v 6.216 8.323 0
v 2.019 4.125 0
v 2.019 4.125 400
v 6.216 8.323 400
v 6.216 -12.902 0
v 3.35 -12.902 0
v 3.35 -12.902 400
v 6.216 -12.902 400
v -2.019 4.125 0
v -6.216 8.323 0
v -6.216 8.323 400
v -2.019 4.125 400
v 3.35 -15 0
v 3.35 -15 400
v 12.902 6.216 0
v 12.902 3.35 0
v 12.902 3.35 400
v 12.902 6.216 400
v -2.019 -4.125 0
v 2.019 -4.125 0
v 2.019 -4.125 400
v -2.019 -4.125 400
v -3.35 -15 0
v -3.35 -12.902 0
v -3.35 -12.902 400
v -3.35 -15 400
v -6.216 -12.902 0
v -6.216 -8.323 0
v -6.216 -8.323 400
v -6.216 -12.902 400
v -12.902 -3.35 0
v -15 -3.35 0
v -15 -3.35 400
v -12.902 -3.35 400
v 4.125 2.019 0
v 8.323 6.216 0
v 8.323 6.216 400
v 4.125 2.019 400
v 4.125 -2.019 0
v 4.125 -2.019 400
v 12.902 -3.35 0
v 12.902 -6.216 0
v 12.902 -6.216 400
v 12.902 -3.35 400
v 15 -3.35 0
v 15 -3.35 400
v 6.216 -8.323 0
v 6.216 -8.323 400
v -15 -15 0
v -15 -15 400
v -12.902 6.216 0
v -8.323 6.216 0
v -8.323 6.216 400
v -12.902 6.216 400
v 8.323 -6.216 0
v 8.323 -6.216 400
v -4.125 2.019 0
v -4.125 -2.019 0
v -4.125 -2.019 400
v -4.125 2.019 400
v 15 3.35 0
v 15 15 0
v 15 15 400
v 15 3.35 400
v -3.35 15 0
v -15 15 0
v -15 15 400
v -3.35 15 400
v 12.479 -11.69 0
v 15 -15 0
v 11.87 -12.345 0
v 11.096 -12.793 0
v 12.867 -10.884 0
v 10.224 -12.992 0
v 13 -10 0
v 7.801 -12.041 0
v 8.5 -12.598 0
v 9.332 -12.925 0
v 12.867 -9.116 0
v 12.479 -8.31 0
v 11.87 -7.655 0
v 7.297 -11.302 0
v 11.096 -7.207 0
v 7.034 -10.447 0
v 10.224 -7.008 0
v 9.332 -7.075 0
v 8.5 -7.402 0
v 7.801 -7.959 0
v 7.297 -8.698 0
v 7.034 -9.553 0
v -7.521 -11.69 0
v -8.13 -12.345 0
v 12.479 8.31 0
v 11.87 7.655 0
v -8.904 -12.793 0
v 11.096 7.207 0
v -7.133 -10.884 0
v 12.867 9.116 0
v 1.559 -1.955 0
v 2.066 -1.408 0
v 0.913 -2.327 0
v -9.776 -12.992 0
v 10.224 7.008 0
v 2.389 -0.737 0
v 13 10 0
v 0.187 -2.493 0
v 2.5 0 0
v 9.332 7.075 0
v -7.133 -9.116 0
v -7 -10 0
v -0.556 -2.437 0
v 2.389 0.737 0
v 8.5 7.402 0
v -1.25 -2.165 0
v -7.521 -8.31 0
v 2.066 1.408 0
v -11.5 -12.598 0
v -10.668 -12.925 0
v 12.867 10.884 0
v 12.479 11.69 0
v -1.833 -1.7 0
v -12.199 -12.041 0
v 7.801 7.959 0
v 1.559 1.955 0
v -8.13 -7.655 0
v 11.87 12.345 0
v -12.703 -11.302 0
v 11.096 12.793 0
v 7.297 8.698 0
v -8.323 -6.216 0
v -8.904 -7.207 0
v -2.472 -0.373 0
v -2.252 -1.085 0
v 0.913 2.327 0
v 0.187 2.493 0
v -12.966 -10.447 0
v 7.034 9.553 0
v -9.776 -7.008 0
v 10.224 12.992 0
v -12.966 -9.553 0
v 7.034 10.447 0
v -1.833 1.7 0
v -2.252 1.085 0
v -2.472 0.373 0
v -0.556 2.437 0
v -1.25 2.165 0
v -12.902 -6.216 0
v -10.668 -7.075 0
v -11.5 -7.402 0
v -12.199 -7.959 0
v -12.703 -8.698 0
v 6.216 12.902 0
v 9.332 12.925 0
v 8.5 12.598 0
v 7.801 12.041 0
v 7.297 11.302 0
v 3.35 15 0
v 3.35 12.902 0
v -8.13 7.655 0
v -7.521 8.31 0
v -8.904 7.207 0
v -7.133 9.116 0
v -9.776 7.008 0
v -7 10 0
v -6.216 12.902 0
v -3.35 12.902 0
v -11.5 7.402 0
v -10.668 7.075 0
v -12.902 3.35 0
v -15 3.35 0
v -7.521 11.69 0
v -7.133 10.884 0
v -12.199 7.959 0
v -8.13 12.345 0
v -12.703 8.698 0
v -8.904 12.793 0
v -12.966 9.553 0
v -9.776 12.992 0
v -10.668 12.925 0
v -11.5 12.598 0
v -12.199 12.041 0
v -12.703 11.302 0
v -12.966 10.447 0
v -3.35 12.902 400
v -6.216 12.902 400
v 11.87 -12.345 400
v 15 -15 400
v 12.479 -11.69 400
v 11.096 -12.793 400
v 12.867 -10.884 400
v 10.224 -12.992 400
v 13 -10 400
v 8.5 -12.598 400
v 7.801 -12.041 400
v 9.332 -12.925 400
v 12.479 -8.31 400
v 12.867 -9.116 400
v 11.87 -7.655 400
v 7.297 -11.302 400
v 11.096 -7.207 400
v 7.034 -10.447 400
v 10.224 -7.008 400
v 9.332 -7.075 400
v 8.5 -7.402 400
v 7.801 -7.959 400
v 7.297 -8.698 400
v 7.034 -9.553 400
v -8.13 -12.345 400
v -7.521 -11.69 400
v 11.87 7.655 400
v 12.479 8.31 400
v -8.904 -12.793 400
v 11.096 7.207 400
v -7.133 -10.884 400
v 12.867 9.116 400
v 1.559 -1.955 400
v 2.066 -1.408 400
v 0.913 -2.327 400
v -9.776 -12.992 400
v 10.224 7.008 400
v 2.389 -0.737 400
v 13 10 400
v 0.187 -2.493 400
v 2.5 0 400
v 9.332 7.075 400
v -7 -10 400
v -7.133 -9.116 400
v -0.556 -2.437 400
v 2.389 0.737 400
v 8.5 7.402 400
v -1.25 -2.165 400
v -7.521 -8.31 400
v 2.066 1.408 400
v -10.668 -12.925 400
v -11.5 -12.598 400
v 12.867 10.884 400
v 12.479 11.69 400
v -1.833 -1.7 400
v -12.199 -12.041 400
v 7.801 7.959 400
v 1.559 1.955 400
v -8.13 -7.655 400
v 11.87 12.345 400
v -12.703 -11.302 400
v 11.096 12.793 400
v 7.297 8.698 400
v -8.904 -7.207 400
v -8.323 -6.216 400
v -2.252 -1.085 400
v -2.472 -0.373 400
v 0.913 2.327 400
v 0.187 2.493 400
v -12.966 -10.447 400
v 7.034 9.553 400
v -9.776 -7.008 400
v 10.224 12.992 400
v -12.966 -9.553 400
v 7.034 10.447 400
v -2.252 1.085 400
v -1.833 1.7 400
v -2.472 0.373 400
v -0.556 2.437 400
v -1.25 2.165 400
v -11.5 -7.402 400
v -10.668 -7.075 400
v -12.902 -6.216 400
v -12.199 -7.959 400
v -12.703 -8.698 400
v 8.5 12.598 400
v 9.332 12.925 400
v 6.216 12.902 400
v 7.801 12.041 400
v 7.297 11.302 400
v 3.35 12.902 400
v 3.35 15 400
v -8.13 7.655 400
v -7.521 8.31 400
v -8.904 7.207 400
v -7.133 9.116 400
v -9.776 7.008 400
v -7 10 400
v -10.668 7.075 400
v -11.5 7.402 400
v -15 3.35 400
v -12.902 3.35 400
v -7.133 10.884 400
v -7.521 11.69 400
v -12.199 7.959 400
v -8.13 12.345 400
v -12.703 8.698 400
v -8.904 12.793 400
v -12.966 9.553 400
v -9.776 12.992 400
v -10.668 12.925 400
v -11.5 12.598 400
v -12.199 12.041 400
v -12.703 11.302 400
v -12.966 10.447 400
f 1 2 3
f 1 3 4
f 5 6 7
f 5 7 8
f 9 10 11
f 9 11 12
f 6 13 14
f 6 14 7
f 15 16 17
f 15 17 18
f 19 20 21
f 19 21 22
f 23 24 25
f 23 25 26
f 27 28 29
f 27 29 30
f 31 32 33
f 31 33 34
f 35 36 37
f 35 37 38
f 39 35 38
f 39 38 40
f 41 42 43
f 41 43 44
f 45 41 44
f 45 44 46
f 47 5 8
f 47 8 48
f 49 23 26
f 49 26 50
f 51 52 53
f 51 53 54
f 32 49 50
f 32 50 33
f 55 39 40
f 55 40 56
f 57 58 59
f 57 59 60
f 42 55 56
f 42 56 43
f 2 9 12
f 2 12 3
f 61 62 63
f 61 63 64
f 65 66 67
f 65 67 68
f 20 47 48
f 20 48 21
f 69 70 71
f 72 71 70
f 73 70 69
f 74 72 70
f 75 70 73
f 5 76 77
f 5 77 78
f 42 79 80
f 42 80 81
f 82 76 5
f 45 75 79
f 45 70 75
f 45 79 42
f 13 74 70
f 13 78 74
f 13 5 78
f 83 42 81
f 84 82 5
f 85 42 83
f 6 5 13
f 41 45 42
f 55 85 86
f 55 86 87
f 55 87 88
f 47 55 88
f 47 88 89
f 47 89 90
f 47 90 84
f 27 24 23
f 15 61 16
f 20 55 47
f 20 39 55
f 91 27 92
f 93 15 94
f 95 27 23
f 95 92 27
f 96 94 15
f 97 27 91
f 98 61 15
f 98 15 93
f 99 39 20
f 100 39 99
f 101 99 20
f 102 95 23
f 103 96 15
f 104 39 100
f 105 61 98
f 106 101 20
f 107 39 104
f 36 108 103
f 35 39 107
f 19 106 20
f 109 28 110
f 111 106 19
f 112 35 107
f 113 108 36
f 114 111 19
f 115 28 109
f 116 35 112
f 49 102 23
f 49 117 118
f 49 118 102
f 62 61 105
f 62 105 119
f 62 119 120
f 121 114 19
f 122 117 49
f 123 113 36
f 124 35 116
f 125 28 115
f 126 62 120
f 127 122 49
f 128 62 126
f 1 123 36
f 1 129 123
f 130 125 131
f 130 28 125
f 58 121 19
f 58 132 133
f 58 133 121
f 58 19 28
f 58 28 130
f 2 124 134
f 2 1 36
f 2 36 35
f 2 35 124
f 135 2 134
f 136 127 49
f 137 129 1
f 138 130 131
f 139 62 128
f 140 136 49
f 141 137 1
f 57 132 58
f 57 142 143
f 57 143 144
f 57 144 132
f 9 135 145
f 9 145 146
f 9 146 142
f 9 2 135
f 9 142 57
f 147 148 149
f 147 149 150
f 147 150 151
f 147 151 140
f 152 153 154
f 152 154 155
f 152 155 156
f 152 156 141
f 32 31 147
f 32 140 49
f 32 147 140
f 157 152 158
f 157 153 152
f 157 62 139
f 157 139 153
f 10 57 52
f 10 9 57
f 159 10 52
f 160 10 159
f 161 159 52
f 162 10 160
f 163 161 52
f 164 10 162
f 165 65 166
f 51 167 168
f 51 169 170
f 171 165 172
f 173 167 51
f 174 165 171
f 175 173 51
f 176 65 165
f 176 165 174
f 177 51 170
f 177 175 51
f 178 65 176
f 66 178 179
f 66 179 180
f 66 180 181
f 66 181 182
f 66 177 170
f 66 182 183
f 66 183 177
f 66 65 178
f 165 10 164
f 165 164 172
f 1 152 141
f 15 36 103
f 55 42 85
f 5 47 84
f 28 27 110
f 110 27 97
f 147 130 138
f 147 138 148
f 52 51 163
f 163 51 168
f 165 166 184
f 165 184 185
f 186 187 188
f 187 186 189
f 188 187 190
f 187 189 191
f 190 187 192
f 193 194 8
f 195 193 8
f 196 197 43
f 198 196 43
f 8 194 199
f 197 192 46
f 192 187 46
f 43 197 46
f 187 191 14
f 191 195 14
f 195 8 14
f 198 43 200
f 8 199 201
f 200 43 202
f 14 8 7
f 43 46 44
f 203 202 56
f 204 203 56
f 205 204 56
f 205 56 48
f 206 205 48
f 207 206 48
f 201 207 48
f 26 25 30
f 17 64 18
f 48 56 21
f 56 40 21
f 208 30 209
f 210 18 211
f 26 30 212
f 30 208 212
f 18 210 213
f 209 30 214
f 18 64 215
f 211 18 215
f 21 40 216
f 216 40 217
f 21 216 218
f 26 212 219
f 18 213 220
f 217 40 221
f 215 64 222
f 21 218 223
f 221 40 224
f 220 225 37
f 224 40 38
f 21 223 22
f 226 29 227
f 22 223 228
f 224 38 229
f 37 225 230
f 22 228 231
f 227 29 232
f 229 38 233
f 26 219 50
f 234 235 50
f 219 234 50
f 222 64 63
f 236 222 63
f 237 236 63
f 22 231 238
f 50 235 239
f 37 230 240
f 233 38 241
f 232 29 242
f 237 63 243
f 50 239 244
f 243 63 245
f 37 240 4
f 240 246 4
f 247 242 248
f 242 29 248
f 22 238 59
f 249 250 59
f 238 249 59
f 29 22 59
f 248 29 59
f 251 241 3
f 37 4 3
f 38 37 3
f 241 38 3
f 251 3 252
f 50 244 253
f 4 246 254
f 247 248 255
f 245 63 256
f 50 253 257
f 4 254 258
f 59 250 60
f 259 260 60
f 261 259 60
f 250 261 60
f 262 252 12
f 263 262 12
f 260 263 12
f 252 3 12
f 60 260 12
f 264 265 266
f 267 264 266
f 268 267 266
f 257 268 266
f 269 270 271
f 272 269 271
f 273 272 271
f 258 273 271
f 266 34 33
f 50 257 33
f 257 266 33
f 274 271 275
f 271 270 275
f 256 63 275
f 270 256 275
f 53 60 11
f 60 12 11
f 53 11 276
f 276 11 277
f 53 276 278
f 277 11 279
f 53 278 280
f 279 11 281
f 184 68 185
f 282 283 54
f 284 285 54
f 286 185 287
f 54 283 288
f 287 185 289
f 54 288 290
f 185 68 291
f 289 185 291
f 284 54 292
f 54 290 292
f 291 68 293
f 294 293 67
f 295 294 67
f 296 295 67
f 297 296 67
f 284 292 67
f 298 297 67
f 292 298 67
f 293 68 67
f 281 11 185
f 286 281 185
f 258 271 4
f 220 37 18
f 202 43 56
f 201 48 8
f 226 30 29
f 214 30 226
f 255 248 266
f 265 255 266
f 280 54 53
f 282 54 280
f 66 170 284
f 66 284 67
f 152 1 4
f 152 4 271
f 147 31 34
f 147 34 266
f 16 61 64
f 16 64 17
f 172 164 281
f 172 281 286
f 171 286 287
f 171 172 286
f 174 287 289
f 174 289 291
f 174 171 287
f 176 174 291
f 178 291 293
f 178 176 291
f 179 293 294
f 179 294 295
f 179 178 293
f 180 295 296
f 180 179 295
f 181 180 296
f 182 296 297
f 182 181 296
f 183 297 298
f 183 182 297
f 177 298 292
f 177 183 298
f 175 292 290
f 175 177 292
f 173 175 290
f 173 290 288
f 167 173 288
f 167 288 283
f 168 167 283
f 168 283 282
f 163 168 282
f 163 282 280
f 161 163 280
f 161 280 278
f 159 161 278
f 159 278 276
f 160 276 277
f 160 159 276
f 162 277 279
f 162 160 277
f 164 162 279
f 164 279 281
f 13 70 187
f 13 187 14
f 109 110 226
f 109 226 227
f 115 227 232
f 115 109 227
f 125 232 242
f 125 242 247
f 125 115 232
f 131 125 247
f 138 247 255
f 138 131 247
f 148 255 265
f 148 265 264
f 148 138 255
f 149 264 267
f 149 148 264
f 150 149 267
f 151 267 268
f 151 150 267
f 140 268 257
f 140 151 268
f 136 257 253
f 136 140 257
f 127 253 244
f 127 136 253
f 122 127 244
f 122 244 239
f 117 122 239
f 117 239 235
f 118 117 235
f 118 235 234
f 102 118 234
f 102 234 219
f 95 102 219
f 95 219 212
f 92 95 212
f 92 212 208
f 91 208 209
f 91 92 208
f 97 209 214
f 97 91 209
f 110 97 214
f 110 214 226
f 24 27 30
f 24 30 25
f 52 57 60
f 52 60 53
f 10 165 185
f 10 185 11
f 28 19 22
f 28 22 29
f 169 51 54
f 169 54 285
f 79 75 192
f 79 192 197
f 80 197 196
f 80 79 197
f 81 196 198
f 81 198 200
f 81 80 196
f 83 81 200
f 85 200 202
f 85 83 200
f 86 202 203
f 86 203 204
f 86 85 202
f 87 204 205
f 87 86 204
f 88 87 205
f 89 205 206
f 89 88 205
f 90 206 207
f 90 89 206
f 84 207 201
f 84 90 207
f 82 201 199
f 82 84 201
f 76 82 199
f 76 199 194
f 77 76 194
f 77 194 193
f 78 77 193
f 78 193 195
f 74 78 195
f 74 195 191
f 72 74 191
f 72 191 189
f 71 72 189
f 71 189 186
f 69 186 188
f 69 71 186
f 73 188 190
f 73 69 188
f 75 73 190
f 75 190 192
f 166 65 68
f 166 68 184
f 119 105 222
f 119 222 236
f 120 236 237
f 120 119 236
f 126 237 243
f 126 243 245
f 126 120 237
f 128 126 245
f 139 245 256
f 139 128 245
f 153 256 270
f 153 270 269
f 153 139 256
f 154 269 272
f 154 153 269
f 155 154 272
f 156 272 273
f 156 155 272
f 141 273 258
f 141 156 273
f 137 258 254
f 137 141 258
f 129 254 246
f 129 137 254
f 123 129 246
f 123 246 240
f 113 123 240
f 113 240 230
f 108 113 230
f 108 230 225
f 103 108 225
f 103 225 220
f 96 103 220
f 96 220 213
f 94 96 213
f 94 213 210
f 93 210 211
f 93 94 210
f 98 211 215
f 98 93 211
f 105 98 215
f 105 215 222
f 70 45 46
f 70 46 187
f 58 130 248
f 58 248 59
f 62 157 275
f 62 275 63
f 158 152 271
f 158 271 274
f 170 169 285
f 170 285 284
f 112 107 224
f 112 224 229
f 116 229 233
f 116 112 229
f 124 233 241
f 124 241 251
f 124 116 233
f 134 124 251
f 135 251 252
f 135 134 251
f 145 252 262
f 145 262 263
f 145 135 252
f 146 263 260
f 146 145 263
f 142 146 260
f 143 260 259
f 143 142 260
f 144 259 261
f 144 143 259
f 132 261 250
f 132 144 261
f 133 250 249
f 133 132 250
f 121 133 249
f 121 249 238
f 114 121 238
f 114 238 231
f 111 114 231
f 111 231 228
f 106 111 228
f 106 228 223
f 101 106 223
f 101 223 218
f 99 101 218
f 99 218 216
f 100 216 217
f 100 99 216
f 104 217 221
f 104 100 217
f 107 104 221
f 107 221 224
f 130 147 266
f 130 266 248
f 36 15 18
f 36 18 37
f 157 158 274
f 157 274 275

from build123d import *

# Parameters (mm, degrees)
SKETCH1_R           = 2.5
SKETCH1_R_2         = 3
BOSS_EXTRUDE1_DEPTH = 400


with BuildPart() as part:
    # Sketch1 → Boss-Extrude1 (new body)
    with BuildSketch(Plane.XY):
        Polygon((-15, 15), (-3.35, 15), (-3.35, 12.901975832), (-6.216494866, 12.901975832), (-6.216494866, 8.323198212), (-2.018681454, 4.1253848), (2.018681454, 4.1253848), (6.216494866, 8.323198212), (6.216494866, 12.901975832), (3.35, 12.901975832), (3.35, 15), (15, 15), (15, 3.35), (12.901975832, 3.35), (12.901975832, 6.216494866), (8.323198212, 6.216494866), (4.1253848, 2.018681454), (4.1253848, -2.018681454), (8.323198212, -6.216494866), (12.901975832, -6.216494866), (12.901975832, -3.35), (15, -3.35), (15, -15), (3.35, -15), (3.35, -12.901975832), (6.216494866, -12.901975832), (6.216494866, -8.323198212), (2.018681454, -4.1253848), (-2.018681454, -4.1253848), (-6.216494866, -8.323198212), (-6.216494866, -12.901975832), (-3.35, -12.901975832), (-3.35, -15), (-15, -15), (-15, -3.35), (-12.901975832, -3.35), (-12.901975832, -6.216494866), (-8.323198212, -6.216494866), (-4.1253848, -2.018681454), (-4.1253848, 2.018681454), (-8.323198212, 6.216494866), (-12.901975832, 6.216494866), (-12.901975832, 3.35), (-15, 3.35), align=None)
        Circle(SKETCH1_R, mode=Mode.SUBTRACT)
        with Locations((10, 10)):
            Circle(SKETCH1_R_2, mode=Mode.SUBTRACT)
        with Locations((-10, 10)):
            Circle(SKETCH1_R_2, mode=Mode.SUBTRACT)
        with Locations((-10, -10)):
            Circle(SKETCH1_R_2, mode=Mode.SUBTRACT)
        with Locations((10, -10)):
            Circle(SKETCH1_R_2, mode=Mode.SUBTRACT)
    extrude(amount=BOSS_EXTRUDE1_DEPTH)


solid = part.part
